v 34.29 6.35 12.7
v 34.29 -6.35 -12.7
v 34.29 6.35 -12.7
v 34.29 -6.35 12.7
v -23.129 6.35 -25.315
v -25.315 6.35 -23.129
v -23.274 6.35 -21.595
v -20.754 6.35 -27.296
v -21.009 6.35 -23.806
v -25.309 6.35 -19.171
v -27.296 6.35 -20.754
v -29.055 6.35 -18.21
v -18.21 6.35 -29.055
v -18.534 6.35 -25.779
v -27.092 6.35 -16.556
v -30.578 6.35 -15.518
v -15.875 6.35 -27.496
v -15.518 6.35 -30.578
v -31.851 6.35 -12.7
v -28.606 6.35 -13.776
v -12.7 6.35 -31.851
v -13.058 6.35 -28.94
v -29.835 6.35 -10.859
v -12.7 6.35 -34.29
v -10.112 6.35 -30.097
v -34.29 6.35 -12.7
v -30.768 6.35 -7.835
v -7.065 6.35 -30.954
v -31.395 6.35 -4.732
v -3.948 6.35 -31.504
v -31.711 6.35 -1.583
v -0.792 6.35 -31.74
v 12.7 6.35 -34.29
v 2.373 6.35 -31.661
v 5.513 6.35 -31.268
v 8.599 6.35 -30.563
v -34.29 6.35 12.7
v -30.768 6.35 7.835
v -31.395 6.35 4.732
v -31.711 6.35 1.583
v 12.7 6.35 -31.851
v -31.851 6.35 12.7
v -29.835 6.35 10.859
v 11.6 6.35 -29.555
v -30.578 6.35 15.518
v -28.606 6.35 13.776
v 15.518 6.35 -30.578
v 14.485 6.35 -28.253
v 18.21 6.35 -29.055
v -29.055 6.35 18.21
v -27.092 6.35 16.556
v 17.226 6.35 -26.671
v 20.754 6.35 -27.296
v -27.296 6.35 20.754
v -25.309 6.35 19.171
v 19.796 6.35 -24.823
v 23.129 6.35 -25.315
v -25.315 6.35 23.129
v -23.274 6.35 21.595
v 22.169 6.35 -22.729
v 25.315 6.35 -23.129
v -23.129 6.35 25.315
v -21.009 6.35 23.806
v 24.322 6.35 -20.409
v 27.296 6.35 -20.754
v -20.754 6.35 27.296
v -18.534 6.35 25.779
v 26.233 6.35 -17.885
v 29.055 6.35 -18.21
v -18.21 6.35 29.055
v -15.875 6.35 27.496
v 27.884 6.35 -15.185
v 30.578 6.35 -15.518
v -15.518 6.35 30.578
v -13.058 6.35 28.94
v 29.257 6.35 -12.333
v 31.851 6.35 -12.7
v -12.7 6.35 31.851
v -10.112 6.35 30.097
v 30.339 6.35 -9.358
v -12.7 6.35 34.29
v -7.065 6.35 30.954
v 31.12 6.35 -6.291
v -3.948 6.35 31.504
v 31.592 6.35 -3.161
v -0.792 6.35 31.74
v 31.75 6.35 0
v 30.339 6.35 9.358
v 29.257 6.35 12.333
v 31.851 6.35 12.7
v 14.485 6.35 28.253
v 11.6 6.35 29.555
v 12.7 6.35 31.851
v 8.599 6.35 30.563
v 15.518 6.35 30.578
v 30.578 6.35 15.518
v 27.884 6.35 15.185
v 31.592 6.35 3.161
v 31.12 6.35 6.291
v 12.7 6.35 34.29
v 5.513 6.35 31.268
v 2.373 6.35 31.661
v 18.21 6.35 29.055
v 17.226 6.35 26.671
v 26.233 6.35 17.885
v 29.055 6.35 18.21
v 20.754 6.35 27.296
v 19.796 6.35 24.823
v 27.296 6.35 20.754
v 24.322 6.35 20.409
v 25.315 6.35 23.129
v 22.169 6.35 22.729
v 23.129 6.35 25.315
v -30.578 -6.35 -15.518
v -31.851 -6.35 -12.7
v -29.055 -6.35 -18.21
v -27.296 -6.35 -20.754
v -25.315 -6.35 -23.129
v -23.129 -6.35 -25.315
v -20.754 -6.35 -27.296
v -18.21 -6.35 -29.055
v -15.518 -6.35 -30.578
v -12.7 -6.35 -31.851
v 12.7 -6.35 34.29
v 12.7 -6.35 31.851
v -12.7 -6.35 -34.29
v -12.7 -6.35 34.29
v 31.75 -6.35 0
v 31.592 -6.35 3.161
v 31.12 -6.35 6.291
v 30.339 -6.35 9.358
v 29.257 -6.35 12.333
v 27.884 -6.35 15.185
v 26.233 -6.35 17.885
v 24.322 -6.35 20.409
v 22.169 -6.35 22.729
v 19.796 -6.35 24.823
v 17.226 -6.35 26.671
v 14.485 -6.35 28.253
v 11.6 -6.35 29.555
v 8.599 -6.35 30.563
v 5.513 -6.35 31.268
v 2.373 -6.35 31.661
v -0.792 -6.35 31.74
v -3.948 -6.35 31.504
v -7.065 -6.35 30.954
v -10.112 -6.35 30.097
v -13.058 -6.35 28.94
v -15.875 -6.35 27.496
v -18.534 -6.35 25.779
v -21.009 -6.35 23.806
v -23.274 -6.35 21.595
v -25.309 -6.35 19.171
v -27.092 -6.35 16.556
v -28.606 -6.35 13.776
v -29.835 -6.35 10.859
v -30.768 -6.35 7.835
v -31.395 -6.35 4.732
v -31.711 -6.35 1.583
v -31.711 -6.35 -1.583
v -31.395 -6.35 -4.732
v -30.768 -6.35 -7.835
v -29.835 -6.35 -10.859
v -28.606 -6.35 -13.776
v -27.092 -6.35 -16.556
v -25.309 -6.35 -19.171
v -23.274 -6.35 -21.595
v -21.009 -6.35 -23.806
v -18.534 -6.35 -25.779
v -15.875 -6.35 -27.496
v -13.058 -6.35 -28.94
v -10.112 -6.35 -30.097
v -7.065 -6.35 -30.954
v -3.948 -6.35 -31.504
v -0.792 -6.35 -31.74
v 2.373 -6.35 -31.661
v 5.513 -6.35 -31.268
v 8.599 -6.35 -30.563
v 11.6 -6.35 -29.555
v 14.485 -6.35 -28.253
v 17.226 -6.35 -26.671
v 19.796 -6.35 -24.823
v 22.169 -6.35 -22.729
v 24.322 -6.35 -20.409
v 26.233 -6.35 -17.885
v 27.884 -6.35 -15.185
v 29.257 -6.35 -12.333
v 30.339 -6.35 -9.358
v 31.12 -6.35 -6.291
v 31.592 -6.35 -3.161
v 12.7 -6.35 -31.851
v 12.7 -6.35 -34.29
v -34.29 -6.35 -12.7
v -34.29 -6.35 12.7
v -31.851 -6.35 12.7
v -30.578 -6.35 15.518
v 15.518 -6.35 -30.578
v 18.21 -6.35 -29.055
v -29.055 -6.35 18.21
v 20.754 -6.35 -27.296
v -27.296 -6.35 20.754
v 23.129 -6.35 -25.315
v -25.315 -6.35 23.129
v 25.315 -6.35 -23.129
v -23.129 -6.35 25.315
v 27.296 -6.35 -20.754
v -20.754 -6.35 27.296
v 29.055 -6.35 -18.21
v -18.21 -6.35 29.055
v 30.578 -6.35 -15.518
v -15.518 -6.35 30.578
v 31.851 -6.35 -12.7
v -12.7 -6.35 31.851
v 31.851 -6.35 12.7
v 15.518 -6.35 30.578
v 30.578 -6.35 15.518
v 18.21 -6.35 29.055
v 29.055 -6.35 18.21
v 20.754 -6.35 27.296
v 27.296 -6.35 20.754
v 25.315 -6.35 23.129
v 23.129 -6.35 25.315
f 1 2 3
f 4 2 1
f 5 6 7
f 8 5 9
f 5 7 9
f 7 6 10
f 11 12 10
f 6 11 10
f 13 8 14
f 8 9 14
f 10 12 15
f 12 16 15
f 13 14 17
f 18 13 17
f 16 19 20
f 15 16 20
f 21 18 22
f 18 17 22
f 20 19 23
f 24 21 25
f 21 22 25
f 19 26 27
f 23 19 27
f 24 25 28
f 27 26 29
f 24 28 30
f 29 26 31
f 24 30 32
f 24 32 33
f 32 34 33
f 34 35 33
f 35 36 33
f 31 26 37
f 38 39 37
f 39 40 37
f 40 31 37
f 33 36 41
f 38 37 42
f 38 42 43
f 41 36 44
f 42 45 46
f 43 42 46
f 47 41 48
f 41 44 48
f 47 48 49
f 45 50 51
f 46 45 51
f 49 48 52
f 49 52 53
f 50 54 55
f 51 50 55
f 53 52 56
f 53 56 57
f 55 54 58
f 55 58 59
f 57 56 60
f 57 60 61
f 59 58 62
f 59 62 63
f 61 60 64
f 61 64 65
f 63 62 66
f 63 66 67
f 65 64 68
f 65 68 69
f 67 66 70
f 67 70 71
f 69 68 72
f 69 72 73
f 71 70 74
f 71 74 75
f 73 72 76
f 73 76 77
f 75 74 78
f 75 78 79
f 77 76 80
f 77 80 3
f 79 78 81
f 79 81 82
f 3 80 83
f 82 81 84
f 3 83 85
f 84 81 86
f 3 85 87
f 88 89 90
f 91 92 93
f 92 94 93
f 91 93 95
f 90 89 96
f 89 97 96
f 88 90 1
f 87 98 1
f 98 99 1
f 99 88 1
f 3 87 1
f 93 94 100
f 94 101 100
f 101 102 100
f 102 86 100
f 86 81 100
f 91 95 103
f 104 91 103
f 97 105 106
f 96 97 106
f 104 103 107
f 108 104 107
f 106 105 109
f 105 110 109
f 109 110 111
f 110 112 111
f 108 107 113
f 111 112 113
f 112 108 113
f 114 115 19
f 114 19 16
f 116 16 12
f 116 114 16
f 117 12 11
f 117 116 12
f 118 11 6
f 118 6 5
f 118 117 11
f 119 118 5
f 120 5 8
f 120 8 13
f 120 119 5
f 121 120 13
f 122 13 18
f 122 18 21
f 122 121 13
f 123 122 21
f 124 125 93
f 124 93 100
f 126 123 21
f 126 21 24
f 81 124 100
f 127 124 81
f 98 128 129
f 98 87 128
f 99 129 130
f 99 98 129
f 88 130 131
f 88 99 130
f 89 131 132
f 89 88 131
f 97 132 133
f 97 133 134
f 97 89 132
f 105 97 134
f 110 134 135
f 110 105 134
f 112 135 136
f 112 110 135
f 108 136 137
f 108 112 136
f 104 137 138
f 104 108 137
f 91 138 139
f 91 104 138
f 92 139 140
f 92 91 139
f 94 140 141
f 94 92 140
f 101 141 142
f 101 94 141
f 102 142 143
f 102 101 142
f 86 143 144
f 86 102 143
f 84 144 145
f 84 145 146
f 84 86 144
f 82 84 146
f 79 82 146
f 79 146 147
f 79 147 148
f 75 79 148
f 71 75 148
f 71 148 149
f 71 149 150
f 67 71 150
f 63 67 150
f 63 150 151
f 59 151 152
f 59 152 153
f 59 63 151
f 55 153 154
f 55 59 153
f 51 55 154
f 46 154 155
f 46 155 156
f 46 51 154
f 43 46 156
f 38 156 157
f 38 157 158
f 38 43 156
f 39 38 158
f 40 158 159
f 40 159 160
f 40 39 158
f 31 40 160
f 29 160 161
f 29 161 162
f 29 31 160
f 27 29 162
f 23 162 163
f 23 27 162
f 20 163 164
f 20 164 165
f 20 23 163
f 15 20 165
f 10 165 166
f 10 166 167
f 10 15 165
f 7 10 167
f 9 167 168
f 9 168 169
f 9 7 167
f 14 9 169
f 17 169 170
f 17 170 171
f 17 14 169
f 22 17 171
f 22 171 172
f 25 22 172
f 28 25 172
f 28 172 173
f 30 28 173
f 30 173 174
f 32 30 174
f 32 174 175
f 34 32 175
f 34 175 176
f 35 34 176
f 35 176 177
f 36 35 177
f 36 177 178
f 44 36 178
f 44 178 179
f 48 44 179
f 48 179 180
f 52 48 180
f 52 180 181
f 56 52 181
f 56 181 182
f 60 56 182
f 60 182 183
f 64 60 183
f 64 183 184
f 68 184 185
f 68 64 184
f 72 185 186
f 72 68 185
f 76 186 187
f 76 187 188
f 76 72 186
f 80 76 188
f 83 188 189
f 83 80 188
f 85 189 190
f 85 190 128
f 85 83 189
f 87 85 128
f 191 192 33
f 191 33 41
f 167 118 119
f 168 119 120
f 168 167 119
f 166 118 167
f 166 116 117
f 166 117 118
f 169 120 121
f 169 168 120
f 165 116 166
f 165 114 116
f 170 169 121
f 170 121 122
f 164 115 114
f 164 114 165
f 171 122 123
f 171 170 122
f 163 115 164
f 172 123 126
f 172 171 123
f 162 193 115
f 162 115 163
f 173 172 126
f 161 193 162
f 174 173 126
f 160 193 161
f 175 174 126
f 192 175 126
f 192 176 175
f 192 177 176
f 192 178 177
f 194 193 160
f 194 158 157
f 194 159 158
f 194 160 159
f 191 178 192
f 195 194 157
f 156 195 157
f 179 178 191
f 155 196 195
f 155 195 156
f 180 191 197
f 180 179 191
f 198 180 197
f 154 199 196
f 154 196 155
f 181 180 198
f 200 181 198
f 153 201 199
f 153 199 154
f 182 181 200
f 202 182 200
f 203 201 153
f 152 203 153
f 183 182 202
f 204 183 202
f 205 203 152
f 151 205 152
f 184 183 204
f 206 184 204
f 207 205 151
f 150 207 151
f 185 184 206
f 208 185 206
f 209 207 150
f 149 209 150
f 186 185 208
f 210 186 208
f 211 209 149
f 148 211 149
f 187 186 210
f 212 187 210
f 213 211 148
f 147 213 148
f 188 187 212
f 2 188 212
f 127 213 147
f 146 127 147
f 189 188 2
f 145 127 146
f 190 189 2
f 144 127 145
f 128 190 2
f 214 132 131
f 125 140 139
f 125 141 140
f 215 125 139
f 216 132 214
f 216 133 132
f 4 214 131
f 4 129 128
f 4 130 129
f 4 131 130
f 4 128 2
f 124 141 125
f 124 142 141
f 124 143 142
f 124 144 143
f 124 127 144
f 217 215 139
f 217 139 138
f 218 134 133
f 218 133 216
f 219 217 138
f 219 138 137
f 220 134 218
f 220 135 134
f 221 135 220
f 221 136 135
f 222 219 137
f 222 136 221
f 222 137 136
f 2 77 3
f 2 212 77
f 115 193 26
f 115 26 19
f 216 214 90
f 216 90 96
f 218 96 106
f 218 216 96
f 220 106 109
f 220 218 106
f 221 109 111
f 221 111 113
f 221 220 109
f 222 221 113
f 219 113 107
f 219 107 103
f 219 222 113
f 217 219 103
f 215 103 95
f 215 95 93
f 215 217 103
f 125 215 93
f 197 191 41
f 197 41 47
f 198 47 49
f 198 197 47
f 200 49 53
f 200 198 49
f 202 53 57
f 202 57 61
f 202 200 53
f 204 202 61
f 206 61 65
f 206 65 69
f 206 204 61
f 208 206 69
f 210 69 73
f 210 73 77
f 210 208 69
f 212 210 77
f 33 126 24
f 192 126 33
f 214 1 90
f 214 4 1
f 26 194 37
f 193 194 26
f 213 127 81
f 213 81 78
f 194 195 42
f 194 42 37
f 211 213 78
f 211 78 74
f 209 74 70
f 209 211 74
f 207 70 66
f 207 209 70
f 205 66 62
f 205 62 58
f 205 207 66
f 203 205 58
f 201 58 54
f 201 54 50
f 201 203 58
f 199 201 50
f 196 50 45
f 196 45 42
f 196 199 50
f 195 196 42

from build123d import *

# Parameters (mm, degrees)
F0_R     = 31.75
F1_DEPTH = 6.35


with BuildPart() as f1:
    # F0 (on Front) → F1 (new body, symmetric)
    with BuildSketch(Plane.XZ):
        with BuildLine():
            ThreePointArc((31.851438, -12.7), (33.674842, -6.465999), (34.29, 0))
            ThreePointArc((34.29, 0), (33.674842, 6.465999), (31.851438, 12.7))
            ThreePointArc((31.851438, 12.7), (24.246692, 24.246692), (12.7, 31.851438))
            ThreePointArc((12.7, 31.851438), (6.465999, 33.674842), (0, 34.29))
            ThreePointArc((0, 34.29), (-6.465999, 33.674842), (-12.7, 31.851438))
            ThreePointArc((-12.7, 31.851438), (-24.246692, 24.246692), (-31.851438, 12.7))
            ThreePointArc((-31.851438, 12.7), (-33.674842, 6.465999), (-34.29, 0))
            ThreePointArc((-34.29, 0), (-33.674842, -6.465999), (-31.851438, -12.7))
            ThreePointArc((-31.851438, -12.7), (-24.246692, -24.246692), (-12.7, -31.851438))
            ThreePointArc((-12.7, -31.851438), (-6.465999, -33.674842), (0, -34.29))
            ThreePointArc((0, -34.29), (6.465999, -33.674842), (12.7, -31.851438))
            ThreePointArc((12.7, -31.851438), (24.246692, -24.246692), (31.851438, -12.7))
        make_face()
        Circle(F0_R, mode=Mode.SUBTRACT)
        with BuildLine():
            ThreePointArc((-34.29, 0), (-33.674842, 6.465999), (-31.851438, 12.7))
            Line((-31.851438, 12.7), (-34.29, 12.7))
            Line((-34.29, 12.7), (-34.29, 0))
        make_face()
        with BuildLine():
            Line((-34.29, -12.7), (-31.851438, -12.7))
            ThreePointArc((-31.851438, -12.7), (-33.674842, -6.465999), (-34.29, 0))
            Line((-34.29, 0), (-34.29, -12.7))
        make_face()
        with BuildLine():
            ThreePointArc((-12.7, 31.851438), (-6.465999, 33.674842), (0, 34.29))
            Line((0, 34.29), (-12.7, 34.29))
            Line((-12.7, 34.29), (-12.7, 31.851438))
        make_face()
        with BuildLine():
            ThreePointArc((0, 34.29), (6.465999, 33.674842), (12.7, 31.851438))
            Line((12.7, 31.851438), (12.7, 34.29))
            Line((12.7, 34.29), (0, 34.29))
        make_face()
        with BuildLine():
            ThreePointArc((31.851438, 12.7), (33.674842, 6.465999), (34.29, 0))
            Line((34.29, 0), (34.29, 12.7))
            Line((34.29, 12.7), (31.851438, 12.7))
        make_face()
        with BuildLine():
            Line((34.29, -12.7), (34.29, 0))
            ThreePointArc((34.29, 0), (33.674842, -6.465999), (31.851438, -12.7))
            Line((31.851438, -12.7), (34.29, -12.7))
        make_face()
        with BuildLine():
            Line((12.7, -34.29), (12.7, -31.851438))
            ThreePointArc((12.7, -31.851438), (6.465999, -33.674842), (0, -34.29))
            Line((0, -34.29), (12.7, -34.29))
        make_face()
        with BuildLine():
            Line((-12.7, -34.29), (0, -34.29))
            ThreePointArc((0, -34.29), (-6.465999, -33.674842), (-12.7, -31.851438))
            Line((-12.7, -31.851438), (-12.7, -34.29))
        make_face()
    extrude(amount=F1_DEPTH, both=True)


solid = f1.part
